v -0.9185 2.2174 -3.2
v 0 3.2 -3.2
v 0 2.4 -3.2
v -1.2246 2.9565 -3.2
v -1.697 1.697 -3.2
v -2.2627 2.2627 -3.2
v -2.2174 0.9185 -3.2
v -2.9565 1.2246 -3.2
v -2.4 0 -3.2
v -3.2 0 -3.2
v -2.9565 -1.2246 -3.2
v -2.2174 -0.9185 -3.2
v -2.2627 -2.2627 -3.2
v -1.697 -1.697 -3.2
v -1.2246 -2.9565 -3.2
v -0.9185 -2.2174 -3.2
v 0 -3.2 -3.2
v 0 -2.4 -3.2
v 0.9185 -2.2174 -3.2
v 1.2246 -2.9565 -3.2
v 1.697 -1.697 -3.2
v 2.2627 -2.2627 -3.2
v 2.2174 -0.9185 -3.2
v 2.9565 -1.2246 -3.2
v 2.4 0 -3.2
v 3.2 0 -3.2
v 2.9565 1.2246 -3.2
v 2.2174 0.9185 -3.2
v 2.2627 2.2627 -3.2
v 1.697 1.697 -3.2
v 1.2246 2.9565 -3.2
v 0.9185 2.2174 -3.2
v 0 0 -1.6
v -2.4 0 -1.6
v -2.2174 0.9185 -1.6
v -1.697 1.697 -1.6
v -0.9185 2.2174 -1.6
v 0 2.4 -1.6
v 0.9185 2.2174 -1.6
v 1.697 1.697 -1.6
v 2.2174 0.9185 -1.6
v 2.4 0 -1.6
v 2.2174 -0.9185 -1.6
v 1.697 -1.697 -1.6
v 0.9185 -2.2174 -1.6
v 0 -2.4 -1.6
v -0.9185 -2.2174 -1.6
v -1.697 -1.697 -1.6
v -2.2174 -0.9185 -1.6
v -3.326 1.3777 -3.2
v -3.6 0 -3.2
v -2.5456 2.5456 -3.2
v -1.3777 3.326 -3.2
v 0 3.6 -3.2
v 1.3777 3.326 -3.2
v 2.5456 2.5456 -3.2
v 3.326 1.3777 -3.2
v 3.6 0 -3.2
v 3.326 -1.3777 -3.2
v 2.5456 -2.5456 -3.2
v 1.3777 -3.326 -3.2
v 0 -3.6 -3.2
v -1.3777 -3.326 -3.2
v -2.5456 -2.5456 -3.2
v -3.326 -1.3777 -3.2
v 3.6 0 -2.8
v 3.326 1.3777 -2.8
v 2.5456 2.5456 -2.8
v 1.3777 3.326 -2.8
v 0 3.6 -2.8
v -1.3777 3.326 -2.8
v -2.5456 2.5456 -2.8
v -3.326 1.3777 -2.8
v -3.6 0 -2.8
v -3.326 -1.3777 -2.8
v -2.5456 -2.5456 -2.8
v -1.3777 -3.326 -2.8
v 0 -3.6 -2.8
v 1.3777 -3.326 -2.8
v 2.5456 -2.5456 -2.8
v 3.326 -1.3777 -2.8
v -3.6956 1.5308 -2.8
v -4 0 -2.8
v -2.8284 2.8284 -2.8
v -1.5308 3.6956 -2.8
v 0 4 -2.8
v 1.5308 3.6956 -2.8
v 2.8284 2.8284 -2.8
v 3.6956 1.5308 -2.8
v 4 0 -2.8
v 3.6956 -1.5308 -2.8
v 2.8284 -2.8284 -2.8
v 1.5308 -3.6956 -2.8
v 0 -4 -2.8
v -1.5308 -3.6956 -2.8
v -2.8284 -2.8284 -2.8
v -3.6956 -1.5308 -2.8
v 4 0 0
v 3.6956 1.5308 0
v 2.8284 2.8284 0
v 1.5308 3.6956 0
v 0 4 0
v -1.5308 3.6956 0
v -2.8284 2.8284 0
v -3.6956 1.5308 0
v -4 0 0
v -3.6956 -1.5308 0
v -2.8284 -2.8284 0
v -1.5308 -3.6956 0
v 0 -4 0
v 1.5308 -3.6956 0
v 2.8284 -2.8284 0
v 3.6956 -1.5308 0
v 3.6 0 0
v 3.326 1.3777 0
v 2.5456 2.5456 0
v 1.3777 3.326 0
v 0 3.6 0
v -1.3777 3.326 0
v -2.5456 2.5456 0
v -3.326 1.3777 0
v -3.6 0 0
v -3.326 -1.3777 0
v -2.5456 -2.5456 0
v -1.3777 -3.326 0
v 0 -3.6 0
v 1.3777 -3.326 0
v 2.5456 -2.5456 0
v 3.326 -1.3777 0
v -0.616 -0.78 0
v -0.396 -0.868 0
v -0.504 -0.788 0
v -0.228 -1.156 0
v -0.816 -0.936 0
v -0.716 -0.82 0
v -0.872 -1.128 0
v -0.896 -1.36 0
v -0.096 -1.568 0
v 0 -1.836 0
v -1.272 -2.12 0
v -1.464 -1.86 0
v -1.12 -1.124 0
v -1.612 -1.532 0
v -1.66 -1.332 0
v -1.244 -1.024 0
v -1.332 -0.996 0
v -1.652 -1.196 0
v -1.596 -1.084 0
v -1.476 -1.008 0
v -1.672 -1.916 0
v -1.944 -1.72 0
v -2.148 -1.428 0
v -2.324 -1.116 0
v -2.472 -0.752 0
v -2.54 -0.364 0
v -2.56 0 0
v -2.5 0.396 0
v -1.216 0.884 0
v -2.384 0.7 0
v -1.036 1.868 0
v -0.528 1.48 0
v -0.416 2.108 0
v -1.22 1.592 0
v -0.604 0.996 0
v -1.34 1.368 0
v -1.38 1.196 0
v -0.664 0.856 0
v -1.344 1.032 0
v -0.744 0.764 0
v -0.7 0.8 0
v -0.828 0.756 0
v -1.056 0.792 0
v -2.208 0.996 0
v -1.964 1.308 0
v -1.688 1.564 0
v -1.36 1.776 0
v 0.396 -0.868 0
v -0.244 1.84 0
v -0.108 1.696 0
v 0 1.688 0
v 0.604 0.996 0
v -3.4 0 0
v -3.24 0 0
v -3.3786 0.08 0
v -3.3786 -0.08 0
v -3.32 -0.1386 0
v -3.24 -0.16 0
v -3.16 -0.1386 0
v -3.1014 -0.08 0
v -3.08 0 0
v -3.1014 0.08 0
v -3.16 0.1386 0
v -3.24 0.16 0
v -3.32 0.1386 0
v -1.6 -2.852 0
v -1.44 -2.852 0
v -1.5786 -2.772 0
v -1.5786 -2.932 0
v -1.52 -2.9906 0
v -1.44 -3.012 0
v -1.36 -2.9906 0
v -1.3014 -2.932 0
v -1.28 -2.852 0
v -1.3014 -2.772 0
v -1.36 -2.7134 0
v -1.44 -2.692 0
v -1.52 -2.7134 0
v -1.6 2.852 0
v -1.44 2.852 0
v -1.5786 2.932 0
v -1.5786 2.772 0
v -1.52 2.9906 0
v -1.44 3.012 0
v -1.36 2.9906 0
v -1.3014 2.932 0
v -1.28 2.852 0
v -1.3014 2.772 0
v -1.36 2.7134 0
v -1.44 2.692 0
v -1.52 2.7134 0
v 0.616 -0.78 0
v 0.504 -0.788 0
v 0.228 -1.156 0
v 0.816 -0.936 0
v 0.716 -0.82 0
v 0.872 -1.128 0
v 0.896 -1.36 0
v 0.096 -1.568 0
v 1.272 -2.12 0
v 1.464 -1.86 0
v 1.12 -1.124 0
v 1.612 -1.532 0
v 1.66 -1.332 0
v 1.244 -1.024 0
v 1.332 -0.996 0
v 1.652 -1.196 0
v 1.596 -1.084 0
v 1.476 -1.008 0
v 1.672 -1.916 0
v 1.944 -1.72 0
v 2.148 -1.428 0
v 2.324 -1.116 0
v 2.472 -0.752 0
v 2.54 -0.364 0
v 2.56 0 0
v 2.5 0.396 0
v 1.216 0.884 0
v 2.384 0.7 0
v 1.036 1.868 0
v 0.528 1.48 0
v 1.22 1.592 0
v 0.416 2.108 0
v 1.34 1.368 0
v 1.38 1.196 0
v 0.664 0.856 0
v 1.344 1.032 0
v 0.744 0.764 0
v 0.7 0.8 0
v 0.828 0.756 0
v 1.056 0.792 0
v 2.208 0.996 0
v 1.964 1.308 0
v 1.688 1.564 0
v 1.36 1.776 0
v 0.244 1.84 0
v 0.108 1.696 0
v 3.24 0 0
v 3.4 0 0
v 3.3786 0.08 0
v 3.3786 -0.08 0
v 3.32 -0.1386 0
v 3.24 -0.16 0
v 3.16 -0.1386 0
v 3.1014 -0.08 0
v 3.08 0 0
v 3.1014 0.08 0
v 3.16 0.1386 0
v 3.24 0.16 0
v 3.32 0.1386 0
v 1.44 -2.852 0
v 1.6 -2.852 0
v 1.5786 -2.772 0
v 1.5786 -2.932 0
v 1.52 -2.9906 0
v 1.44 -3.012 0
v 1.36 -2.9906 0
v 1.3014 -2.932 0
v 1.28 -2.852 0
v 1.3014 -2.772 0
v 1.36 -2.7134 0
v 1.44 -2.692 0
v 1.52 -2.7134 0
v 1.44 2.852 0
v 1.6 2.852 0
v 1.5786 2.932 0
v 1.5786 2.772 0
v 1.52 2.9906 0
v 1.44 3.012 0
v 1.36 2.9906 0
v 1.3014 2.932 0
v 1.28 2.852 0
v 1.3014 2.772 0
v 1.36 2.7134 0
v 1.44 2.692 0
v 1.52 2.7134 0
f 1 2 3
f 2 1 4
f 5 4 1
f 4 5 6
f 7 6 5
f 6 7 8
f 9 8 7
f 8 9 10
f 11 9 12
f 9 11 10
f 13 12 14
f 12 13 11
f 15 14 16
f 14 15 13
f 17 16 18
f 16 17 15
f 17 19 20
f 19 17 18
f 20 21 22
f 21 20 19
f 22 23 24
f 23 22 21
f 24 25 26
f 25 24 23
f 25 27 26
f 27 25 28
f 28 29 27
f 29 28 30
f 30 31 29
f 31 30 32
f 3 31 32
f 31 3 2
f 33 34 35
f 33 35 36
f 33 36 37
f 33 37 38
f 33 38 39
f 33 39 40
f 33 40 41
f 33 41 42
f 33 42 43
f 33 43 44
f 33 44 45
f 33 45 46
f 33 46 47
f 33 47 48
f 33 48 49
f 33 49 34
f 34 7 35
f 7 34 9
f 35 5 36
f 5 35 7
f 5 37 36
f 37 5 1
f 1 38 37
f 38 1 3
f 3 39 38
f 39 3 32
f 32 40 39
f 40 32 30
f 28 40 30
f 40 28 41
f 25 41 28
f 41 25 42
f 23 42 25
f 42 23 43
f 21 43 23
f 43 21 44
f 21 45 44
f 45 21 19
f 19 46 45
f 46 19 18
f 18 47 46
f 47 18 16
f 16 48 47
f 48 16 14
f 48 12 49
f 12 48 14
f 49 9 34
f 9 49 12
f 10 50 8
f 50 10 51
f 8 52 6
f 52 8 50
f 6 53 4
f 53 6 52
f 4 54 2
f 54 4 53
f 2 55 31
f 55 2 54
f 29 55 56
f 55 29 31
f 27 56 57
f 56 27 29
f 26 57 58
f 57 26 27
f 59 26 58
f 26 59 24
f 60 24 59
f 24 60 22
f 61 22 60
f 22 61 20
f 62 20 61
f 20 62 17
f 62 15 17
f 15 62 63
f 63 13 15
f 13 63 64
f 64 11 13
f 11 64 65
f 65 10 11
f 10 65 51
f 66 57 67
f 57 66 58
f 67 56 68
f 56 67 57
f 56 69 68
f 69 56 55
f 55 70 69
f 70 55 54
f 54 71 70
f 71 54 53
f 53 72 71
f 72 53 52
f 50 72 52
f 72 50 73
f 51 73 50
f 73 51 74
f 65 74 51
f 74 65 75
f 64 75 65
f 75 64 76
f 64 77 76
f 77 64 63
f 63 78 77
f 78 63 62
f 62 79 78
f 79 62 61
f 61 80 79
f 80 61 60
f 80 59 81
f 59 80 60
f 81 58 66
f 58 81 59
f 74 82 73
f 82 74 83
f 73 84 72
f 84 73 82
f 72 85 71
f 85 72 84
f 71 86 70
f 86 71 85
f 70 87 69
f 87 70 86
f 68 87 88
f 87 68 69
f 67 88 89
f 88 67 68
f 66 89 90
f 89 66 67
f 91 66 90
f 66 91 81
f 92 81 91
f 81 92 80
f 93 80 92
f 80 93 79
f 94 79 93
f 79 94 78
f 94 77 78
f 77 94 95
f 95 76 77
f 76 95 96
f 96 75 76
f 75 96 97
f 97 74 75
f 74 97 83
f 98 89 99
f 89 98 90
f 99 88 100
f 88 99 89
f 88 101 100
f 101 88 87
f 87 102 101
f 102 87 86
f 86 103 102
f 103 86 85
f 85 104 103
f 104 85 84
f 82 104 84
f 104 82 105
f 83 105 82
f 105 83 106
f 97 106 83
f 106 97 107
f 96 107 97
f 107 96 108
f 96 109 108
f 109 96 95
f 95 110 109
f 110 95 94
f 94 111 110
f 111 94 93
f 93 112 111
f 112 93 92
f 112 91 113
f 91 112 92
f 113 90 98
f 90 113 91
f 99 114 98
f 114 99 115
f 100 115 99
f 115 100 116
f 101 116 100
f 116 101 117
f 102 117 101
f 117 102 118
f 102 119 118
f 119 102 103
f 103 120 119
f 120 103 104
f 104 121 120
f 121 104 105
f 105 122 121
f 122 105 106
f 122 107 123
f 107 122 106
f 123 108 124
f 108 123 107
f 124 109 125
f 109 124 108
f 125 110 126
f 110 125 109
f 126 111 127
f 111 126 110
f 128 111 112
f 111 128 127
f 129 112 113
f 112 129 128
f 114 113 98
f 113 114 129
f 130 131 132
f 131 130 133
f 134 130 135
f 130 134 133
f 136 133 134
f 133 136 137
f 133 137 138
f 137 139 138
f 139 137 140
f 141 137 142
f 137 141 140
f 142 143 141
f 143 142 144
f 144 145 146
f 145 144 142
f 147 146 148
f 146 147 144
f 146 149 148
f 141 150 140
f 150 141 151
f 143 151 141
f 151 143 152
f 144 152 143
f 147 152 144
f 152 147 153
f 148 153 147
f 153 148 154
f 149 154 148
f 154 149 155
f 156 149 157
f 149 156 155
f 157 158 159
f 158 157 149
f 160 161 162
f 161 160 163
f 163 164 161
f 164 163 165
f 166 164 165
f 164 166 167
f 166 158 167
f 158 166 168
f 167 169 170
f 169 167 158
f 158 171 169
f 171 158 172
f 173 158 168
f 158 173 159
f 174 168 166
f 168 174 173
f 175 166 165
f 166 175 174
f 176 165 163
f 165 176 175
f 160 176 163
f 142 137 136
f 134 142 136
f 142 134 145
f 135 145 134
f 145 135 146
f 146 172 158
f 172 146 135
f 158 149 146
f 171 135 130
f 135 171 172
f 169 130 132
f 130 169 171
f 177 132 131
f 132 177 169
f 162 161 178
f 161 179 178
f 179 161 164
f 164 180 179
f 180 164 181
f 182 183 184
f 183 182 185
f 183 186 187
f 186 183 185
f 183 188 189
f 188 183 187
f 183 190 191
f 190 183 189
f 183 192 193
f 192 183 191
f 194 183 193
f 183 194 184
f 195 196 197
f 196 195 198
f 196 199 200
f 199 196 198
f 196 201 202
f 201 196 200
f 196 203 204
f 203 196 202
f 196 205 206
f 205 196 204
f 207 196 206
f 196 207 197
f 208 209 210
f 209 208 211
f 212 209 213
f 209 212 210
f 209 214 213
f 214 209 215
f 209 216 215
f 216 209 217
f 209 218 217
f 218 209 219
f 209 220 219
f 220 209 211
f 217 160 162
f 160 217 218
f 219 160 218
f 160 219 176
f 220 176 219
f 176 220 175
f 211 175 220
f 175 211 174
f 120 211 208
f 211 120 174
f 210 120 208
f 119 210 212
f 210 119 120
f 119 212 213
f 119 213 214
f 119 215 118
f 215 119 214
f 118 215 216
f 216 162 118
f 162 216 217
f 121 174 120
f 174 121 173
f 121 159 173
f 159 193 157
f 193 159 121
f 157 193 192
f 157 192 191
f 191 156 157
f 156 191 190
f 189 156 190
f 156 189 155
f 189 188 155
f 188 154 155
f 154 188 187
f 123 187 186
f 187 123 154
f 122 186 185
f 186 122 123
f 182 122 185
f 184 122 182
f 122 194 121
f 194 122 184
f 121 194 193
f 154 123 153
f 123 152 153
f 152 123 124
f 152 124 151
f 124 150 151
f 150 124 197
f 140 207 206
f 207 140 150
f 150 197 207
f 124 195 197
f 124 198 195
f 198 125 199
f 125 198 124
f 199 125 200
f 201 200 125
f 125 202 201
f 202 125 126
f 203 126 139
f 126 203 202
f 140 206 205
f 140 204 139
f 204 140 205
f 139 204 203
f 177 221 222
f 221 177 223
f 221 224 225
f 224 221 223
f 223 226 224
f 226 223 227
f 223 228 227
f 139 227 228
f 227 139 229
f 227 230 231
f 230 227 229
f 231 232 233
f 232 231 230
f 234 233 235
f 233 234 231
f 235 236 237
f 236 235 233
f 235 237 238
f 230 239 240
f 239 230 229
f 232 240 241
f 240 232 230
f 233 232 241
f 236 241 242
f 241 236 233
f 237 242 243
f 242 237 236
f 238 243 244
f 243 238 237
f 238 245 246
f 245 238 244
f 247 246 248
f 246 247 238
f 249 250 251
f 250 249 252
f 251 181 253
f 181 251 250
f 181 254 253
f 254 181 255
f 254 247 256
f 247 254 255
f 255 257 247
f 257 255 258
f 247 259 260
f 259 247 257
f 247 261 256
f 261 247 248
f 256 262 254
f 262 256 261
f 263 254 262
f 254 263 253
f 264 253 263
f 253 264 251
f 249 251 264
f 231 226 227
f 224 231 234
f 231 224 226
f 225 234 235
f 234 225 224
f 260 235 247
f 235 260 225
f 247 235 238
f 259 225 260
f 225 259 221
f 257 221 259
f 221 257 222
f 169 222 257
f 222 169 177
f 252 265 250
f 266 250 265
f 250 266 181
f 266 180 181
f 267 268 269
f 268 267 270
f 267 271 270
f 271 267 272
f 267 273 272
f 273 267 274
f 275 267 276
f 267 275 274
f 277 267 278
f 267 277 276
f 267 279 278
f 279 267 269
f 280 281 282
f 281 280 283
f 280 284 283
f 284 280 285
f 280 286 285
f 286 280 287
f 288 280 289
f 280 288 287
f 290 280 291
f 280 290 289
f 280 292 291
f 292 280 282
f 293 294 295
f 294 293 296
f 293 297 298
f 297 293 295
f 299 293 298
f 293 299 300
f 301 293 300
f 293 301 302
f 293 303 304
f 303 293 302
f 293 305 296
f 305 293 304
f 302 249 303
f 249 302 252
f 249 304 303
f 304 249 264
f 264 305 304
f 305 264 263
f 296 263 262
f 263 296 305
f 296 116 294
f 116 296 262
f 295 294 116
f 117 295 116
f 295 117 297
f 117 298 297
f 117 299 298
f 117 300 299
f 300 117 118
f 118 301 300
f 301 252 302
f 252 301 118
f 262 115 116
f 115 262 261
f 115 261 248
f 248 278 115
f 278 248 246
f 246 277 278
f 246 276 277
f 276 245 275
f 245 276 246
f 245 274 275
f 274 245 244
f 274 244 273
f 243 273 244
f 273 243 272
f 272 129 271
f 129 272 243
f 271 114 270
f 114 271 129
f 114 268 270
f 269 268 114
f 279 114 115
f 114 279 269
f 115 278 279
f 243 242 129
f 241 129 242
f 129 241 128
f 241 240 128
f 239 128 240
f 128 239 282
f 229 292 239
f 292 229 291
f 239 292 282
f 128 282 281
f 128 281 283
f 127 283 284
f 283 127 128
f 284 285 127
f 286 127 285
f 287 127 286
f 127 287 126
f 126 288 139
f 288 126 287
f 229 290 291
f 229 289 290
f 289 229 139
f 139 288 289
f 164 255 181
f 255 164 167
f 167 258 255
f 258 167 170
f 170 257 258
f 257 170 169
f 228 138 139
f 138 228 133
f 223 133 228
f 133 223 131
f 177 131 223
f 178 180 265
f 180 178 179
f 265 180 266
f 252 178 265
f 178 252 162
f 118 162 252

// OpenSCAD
use <../lib.scad>
use <../p/4-4ering.scad>
use <s/98138s01.scad>
$fa=1; $fs=0.2;
function ldraw_lib__98138pb9(realsolid=false) = [
// 0 Tile  1 x  1 Round with Metallic Silver Batman Logo and Six Reddish Brown Rivets Pattern
// 0 Name: 98138pb9.dat
// 0 Author: Gerald Lasser [GeraldLasser]
// 0 !LDRAW_ORG Part UPDATE 2022-01
// 0 !LICENSE Licensed under CC BY 2.0 and CC BY 4.0 : see CAreadme.txt
// 
// 0 BFC CERTIFY CCW
  [0,"BFC","CERTIFY"],
  [0,"BFC","CCW"],
// 
// 0 !KEYWORDS 1989, Batmobile, Bricklink 98138pb111, Set 76139
// 
// 0 !HISTORY 2022-01-14 [PTadmin] Official Update 2022-01
// 
// 
// 1 16 0 0 0 1 0 0 0 1 0 0 0 1 s\98138s01.dat
  [1,16,0,0,0,1,0,0,0,1,0,0,0,1, ldraw_lib__s__98138s01(realsolid)],
// 1 16 0 0 0 9 0 0 0 1 0 0 0 9 4-4ering.dat
  [1,16,0,0,0,9,0,0,0,1,0,0,0,9, ldraw_lib__4_4ering(realsolid)],
// 4 16 -0.57 0 -2.89 -0.99 0 -2.17 -1.26 0 -1.97 -1.54 0 -1.95
  [4,16,-0.57,0,-2.89,-0.99,0,-2.17,-1.26,0,-1.97,-1.54,0,-1.95],
// 4 16 -0.57 0 -2.89 -1.54 0 -1.95 -1.79 0 -2.05 -2.04 0 -2.34
  [4,16,-0.57,0,-2.89,-1.54,0,-1.95,-1.79,0,-2.05,-2.04,0,-2.34],
// 4 16 -0.57 0 -2.89 -2.04 0 -2.34 -2.18 0 -2.82 -2.24 0 -3.4
  [4,16,-0.57,0,-2.89,-2.04,0,-2.34,-2.18,0,-2.82,-2.24,0,-3.4],
// 3 16 -0.57 0 -2.89 -2.24 0 -3.4 -0.24 0 -3.92
  [3,16,-0.57,0,-2.89,-2.24,0,-3.4,-0.24,0,-3.92],
// 4 16 0 0 -4.59 -0.24 0 -3.92 -2.24 0 -3.4 -3.18 0 -5.3
  [4,16,0,0,-4.59,-0.24,0,-3.92,-2.24,0,-3.4,-3.18,0,-5.3],
// 4 16 -3.66 0 -4.65 -3.18 0 -5.3 -2.24 0 -3.4 -2.8 0 -2.81
  [4,16,-3.66,0,-4.65,-3.18,0,-5.3,-2.24,0,-3.4,-2.8,0,-2.81],
// 4 16 -4.03 0 -3.83 -3.66 0 -4.65 -2.8 0 -2.81 -4.15 0 -3.33
  [4,16,-4.03,0,-3.83,-3.66,0,-4.65,-2.8,0,-2.81,-4.15,0,-3.33],
// 4 16 -4.15 0 -3.33 -2.8 0 -2.81 -3.11 0 -2.56 -3.33 0 -2.49
  [4,16,-4.15,0,-3.33,-2.8,0,-2.81,-3.11,0,-2.56,-3.33,0,-2.49],
// 4 16 -4.13 0 -2.99 -4.15 0 -3.33 -3.33 0 -2.49 -3.99 0 -2.71
  [4,16,-4.13,0,-2.99,-4.15,0,-3.33,-3.33,0,-2.49,-3.99,0,-2.71],
// 3 16 -3.33 0 -2.49 -3.69 0 -2.52 -3.99 0 -2.71
  [3,16,-3.33,0,-2.49,-3.69,0,-2.52,-3.99,0,-2.71],
// 4 80 -4.18 0 -4.79 -3.18 0 -5.3 -3.66 0 -4.65 -4.86 0 -4.3
  [4,80,-4.18,0,-4.79,-3.18,0,-5.3,-3.66,0,-4.65,-4.86,0,-4.3],
// 4 80 -4.86 0 -4.3 -3.66 0 -4.65 -4.03 0 -3.83 -5.37 0 -3.57
  [4,80,-4.86,0,-4.3,-3.66,0,-4.65,-4.03,0,-3.83,-5.37,0,-3.57],
// 3 80 -4.15 0 -3.33 -5.37 0 -3.57 -4.03 0 -3.83
  [3,80,-4.15,0,-3.33,-5.37,0,-3.57,-4.03,0,-3.83],
// 4 80 -5.37 0 -3.57 -4.15 0 -3.33 -4.13 0 -2.99 -5.81 0 -2.79
  [4,80,-5.37,0,-3.57,-4.15,0,-3.33,-4.13,0,-2.99,-5.81,0,-2.79],
// 4 80 -5.81 0 -2.79 -4.13 0 -2.99 -3.99 0 -2.71 -6.18 0 -1.88
  [4,80,-5.81,0,-2.79,-4.13,0,-2.99,-3.99,0,-2.71,-6.18,0,-1.88],
// 4 80 -6.35 0 -.91 -6.18 0 -1.88 -3.99 0 -2.71 -3.69 0 -2.52
  [4,80,-6.35,0,-.91,-6.18,0,-1.88,-3.99,0,-2.71,-3.69,0,-2.52],
// 4 80 -6.4 0 0 -6.35 0 -.91 -3.69 0 -2.52 -6.25 0 .99
  [4,80,-6.4,0,0,-6.35,0,-.91,-3.69,0,-2.52,-6.25,0,.99],
// 4 80 -6.25 0 .99 -3.69 0 -2.52 -3.04 0 2.21 -5.96 0 1.75
  [4,80,-6.25,0,.99,-3.69,0,-2.52,-3.04,0,2.21,-5.96,0,1.75],
// 4 16 -1.04 0 5.27 -2.59 0 4.67 -3.05 0 3.98 -1.32 0 3.7
  [4,16,-1.04,0,5.27,-2.59,0,4.67,-3.05,0,3.98,-1.32,0,3.7],
// 4 16 -1.32 0 3.7 -3.05 0 3.98 -3.35 0 3.42 -1.51 0 2.49
  [4,16,-1.32,0,3.7,-3.05,0,3.98,-3.35,0,3.42,-1.51,0,2.49],
// 4 16 -1.66 0 2.14 -1.51 0 2.49 -3.35 0 3.42 -3.45 0 2.99
  [4,16,-1.66,0,2.14,-1.51,0,2.49,-3.35,0,3.42,-3.45,0,2.99],
// 4 16 -1.66 0 2.14 -3.45 0 2.99 -3.36 0 2.58 -3.04 0 2.21
  [4,16,-1.66,0,2.14,-3.45,0,2.99,-3.36,0,2.58,-3.04,0,2.21],
// 4 16 -1.75 0 2 -1.66 0 2.14 -3.04 0 2.21 -1.86 0 1.91
  [4,16,-1.75,0,2,-1.66,0,2.14,-3.04,0,2.21,-1.86,0,1.91],
// 4 16 -2.07 0 1.89 -1.86 0 1.91 -3.04 0 2.21 -2.64 0 1.98
  [4,16,-2.07,0,1.89,-1.86,0,1.91,-3.04,0,2.21,-2.64,0,1.98],
// 4 80 -5.96 0 1.75 -3.04 0 2.21 -3.36 0 2.58 -5.52 0 2.49
  [4,80,-5.96,0,1.75,-3.04,0,2.21,-3.36,0,2.58,-5.52,0,2.49],
// 4 80 -5.52 0 2.49 -3.36 0 2.58 -3.45 0 2.99 -4.91 0 3.27
  [4,80,-5.52,0,2.49,-3.36,0,2.58,-3.45,0,2.99,-4.91,0,3.27],
// 4 80 -4.91 0 3.27 -3.45 0 2.99 -3.35 0 3.42 -4.22 0 3.91
  [4,80,-4.91,0,3.27,-3.45,0,2.99,-3.35,0,3.42,-4.22,0,3.91],
// 4 80 -4.22 0 3.91 -3.35 0 3.42 -3.05 0 3.98 -3.4 0 4.44
  [4,80,-4.22,0,3.91,-3.35,0,3.42,-3.05,0,3.98,-3.4,0,4.44],
// 3 80 -2.59 0 4.67 -3.4 0 4.44 -3.05 0 3.98
  [3,80,-2.59,0,4.67,-3.4,0,4.44,-3.05,0,3.98],
// 3 80 -2.8 0 -2.81 -2.24 0 -3.4 -2.18 0 -2.82
  [3,80,-2.8,0,-2.81,-2.24,0,-3.4,-2.18,0,-2.82],
// 4 80 -3.11 0 -2.56 -2.8 0 -2.81 -2.18 0 -2.82 -2.04 0 -2.34
  [4,80,-3.11,0,-2.56,-2.8,0,-2.81,-2.18,0,-2.82,-2.04,0,-2.34],
// 4 80 -3.33 0 -2.49 -3.11 0 -2.56 -2.04 0 -2.34 -1.79 0 -2.05
  [4,80,-3.33,0,-2.49,-3.11,0,-2.56,-2.04,0,-2.34,-1.79,0,-2.05],
// 4 80 -3.33 0 -2.49 -1.79 0 -2.05 -2.64 0 1.98 -3.04 0 2.21
  [4,80,-3.33,0,-2.49,-1.79,0,-2.05,-2.64,0,1.98,-3.04,0,2.21],
// 3 80 -3.04 0 2.21 -3.69 0 -2.52 -3.33 0 -2.49
  [3,80,-3.04,0,2.21,-3.69,0,-2.52,-3.33,0,-2.49],
// 4 80 -2.07 0 1.89 -2.64 0 1.98 -1.79 0 -2.05 -1.54 0 -1.95
  [4,80,-2.07,0,1.89,-2.64,0,1.98,-1.79,0,-2.05,-1.54,0,-1.95],
// 4 80 -2.07 0 1.89 -1.54 0 -1.95 -1.26 0 -1.97 -1.86 0 1.91
  [4,80,-2.07,0,1.89,-1.54,0,-1.95,-1.26,0,-1.97,-1.86,0,1.91],
// 4 80 -1.86 0 1.91 -1.26 0 -1.97 -.99 0 -2.17 .99 0 -2.17
  [4,80,-1.86,0,1.91,-1.26,0,-1.97,-.99,0,-2.17,.99,0,-2.17],
// 3 80 -1.04 0 5.27 -1.32 0 3.7 -.61 0 4.6
  [3,80,-1.04,0,5.27,-1.32,0,3.7,-.61,0,4.6],
// 4 80 -.27 0 4.24 -.61 0 4.6 -1.32 0 3.7 -1.51 0 2.49
  [4,80,-.27,0,4.24,-.61,0,4.6,-1.32,0,3.7,-1.51,0,2.49],
// 4 80 0 0 4.22 -.27 0 4.24 -1.51 0 2.49 1.51 0 2.49
  [4,80,0,0,4.22,-.27,0,4.24,-1.51,0,2.49,1.51,0,2.49],
// 4 70 -8.1 0 0 -8.44641 0 0.2 -8.5 0 0 -8.44641 0 -0.2
  [4,70,-8.1,0,0,-8.44641,0,0.2,-8.5,0,0,-8.44641,0,-0.2],
// 4 70 -8.1 0 0 -8.44641 0 -0.2 -8.3 0 -0.34641 -8.1 0 -0.4
  [4,70,-8.1,0,0,-8.44641,0,-0.2,-8.3,0,-0.34641,-8.1,0,-0.4],
// 4 70 -8.1 0 0 -8.1 0 -0.4 -7.9 0 -0.34641 -7.75359 0 -0.2
  [4,70,-8.1,0,0,-8.1,0,-0.4,-7.9,0,-0.34641,-7.75359,0,-0.2],
// 4 70 -8.1 0 0 -7.75359 0 -0.2 -7.7 0 0 -7.75359 0 0.2
  [4,70,-8.1,0,0,-7.75359,0,-0.2,-7.7,0,0,-7.75359,0,0.2],
// 4 70 -8.1 0 0 -7.75359 0 0.2 -7.9 0 0.34641 -8.1 0 0.4
  [4,70,-8.1,0,0,-7.75359,0,0.2,-7.9,0,0.34641,-8.1,0,0.4],
// 4 70 -8.1 0 0 -8.1 0 0.4 -8.3 0 0.34641 -8.44641 0 0.2
  [4,70,-8.1,0,0,-8.1,0,0.4,-8.3,0,0.34641,-8.44641,0,0.2],
// 4 70 -3.6 0 -7.13 -3.94641 0 -6.93 -4 0 -7.13 -3.94641 0 -7.33
  [4,70,-3.6,0,-7.13,-3.94641,0,-6.93,-4,0,-7.13,-3.94641,0,-7.33],
// 4 70 -3.6 0 -7.13 -3.94641 0 -7.33 -3.8 0 -7.47641 -3.6 0 -7.53
  [4,70,-3.6,0,-7.13,-3.94641,0,-7.33,-3.8,0,-7.47641,-3.6,0,-7.53],
// 4 70 -3.6 0 -7.13 -3.6 0 -7.53 -3.4 0 -7.47641 -3.25359 0 -7.33
  [4,70,-3.6,0,-7.13,-3.6,0,-7.53,-3.4,0,-7.47641,-3.25359,0,-7.33],
// 4 70 -3.6 0 -7.13 -3.25359 0 -7.33 -3.2 0 -7.13 -3.25359 0 -6.93
  [4,70,-3.6,0,-7.13,-3.25359,0,-7.33,-3.2,0,-7.13,-3.25359,0,-6.93],
// 4 70 -3.6 0 -7.13 -3.25359 0 -6.93 -3.4 0 -6.78359 -3.6 0 -6.73
  [4,70,-3.6,0,-7.13,-3.25359,0,-6.93,-3.4,0,-6.78359,-3.6,0,-6.73],
// 4 70 -3.6 0 -7.13 -3.6 0 -6.73 -3.8 0 -6.78359 -3.94641 0 -6.93
  [4,70,-3.6,0,-7.13,-3.6,0,-6.73,-3.8,0,-6.78359,-3.94641,0,-6.93],
// 4 70 -4 0 7.13 -3.94641 0 6.93 -3.6 0 7.13 -3.94641 0 7.33
  [4,70,-4,0,7.13,-3.94641,0,6.93,-3.6,0,7.13,-3.94641,0,7.33],
// 4 70 -3.8 0 7.47641 -3.94641 0 7.33 -3.6 0 7.13 -3.6 0 7.53
  [4,70,-3.8,0,7.47641,-3.94641,0,7.33,-3.6,0,7.13,-3.6,0,7.53],
// 4 70 -3.4 0 7.47641 -3.6 0 7.53 -3.6 0 7.13 -3.25359 0 7.33
  [4,70,-3.4,0,7.47641,-3.6,0,7.53,-3.6,0,7.13,-3.25359,0,7.33],
// 4 70 -3.2 0 7.13 -3.25359 0 7.33 -3.6 0 7.13 -3.25359 0 6.93
  [4,70,-3.2,0,7.13,-3.25359,0,7.33,-3.6,0,7.13,-3.25359,0,6.93],
// 4 70 -3.4 0 6.78359 -3.25359 0 6.93 -3.6 0 7.13 -3.6 0 6.73
  [4,70,-3.4,0,6.78359,-3.25359,0,6.93,-3.6,0,7.13,-3.6,0,6.73],
// 4 70 -3.8 0 6.78359 -3.6 0 6.73 -3.6 0 7.13 -3.94641 0 6.93
  [4,70,-3.8,0,6.78359,-3.6,0,6.73,-3.6,0,7.13,-3.94641,0,6.93],
// 4 16 -1.04 0 5.27 -3.25359 0 6.93 -3.4 0 6.78359 -2.59 0 4.67
  [4,16,-1.04,0,5.27,-3.25359,0,6.93,-3.4,0,6.78359,-2.59,0,4.67],
// 4 16 -3.4 0 4.44 -2.59 0 4.67 -3.4 0 6.78359 -3.6 0 6.73
  [4,16,-3.4,0,4.44,-2.59,0,4.67,-3.4,0,6.78359,-3.6,0,6.73],
// 4 16 -3.4 0 4.44 -3.6 0 6.73 -3.8 0 6.78359 -4.22 0 3.91
  [4,16,-3.4,0,4.44,-3.6,0,6.73,-3.8,0,6.78359,-4.22,0,3.91],
// 4 16 -4.22 0 3.91 -3.8 0 6.78359 -3.94641 0 6.93 -4.91 0 3.27
  [4,16,-4.22,0,3.91,-3.8,0,6.78359,-3.94641,0,6.93,-4.91,0,3.27],
// 4 16 -6.3639 0 6.3639 -4.91 0 3.27 -3.94641 0 6.93 -4 0 7.13
  [4,16,-6.3639,0,6.3639,-4.91,0,3.27,-3.94641,0,6.93,-4,0,7.13],
// 3 16 -3.94641 0 7.33 -6.3639 0 6.3639 -4 0 7.13
  [3,16,-3.94641,0,7.33,-6.3639,0,6.3639,-4,0,7.13],
// 4 16 -6.3639 0 6.3639 -3.94641 0 7.33 -3.8 0 7.47641 -3.4443 0 8.3151
  [4,16,-6.3639,0,6.3639,-3.94641,0,7.33,-3.8,0,7.47641,-3.4443,0,8.3151],
// 3 16 -3.4443 0 8.3151 -3.8 0 7.47641 -3.6 0 7.53
  [3,16,-3.4443,0,8.3151,-3.8,0,7.47641,-3.6,0,7.53],
// 3 16 -3.4443 0 8.3151 -3.6 0 7.53 -3.4 0 7.47641
  [3,16,-3.4443,0,8.3151,-3.6,0,7.53,-3.4,0,7.47641],
// 4 16 -3.4443 0 8.3151 -3.4 0 7.47641 -3.25359 0 7.33 0 0 9
  [4,16,-3.4443,0,8.3151,-3.4,0,7.47641,-3.25359,0,7.33,0,0,9],
// 3 16 0 0 9 -3.25359 0 7.33 -3.2 0 7.13
  [3,16,0,0,9,-3.25359,0,7.33,-3.2,0,7.13],
// 4 16 0 0 9 -3.2 0 7.13 -3.25359 0 6.93 -1.04 0 5.27
  [4,16,0,0,9,-3.2,0,7.13,-3.25359,0,6.93,-1.04,0,5.27],
// 4 16 -8.3151 0 3.4443 -5.52 0 2.49 -4.91 0 3.27 -6.3639 0 6.3639
  [4,16,-8.3151,0,3.4443,-5.52,0,2.49,-4.91,0,3.27,-6.3639,0,6.3639],
// 3 16 -8.3151 0 3.4443 -5.96 0 1.75 -5.52 0 2.49
  [3,16,-8.3151,0,3.4443,-5.96,0,1.75,-5.52,0,2.49],
// 4 16 -6.25 0 0.99 -5.96 0 1.75 -8.3151 0 3.4443 -8.1 0 0.4
  [4,16,-6.25,0,0.99,-5.96,0,1.75,-8.3151,0,3.4443,-8.1,0,0.4],
// 3 16 -6.25 0 0.99 -8.1 0 0.4 -7.9 0 0.34641
  [3,16,-6.25,0,0.99,-8.1,0,0.4,-7.9,0,0.34641],
// 3 16 -6.25 0 0.99 -7.9 0 0.34641 -7.75359 0 0.2
  [3,16,-6.25,0,0.99,-7.9,0,0.34641,-7.75359,0,0.2],
// 4 16 -6.25 0 0.99 -7.75359 0 0.2 -7.7 0 0 -6.4 0 0
  [4,16,-6.25,0,0.99,-7.75359,0,0.2,-7.7,0,0,-6.4,0,0],
// 4 16 -6.4 0 0 -7.7 0 0 -7.75359 0 -0.2 -6.35 0 -0.91
  [4,16,-6.4,0,0,-7.7,0,0,-7.75359,0,-0.2,-6.35,0,-0.91],
// 3 16 -7.75359 0 -0.2 -7.9 0 -0.34641 -6.35 0 -0.91
  [3,16,-7.75359,0,-0.2,-7.9,0,-0.34641,-6.35,0,-0.91],
// 4 16 -6.35 0 -0.91 -7.9 0 -0.34641 -8.1 0 -0.4 -6.18 0 -1.88
  [4,16,-6.35,0,-0.91,-7.9,0,-0.34641,-8.1,0,-0.4,-6.18,0,-1.88],
// 4 16 -8.3151 0 -3.4443 -6.18 0 -1.88 -8.1 0 -0.4 -8.3 0 -0.34641
  [4,16,-8.3151,0,-3.4443,-6.18,0,-1.88,-8.1,0,-0.4,-8.3,0,-0.34641],
// 4 16 -8.3151 0 -3.4443 -8.3 0 -0.34641 -8.44641 0 -0.2 -9 0 0
  [4,16,-8.3151,0,-3.4443,-8.3,0,-0.34641,-8.44641,0,-0.2,-9,0,0],
// 3 16 -8.5 0 0 -9 0 0 -8.44641 0 -0.2
  [3,16,-8.5,0,0,-9,0,0,-8.44641,0,-0.2],
// 3 16 -8.44641 0 0.2 -9 0 0 -8.5 0 0
  [3,16,-8.44641,0,0.2,-9,0,0,-8.5,0,0],
// 4 16 -9 0 0 -8.44641 0 0.2 -8.3 0 0.34641 -8.3151 0 3.4443
  [4,16,-9,0,0,-8.44641,0,0.2,-8.3,0,0.34641,-8.3151,0,3.4443],
// 3 16 -8.3151 0 3.4443 -8.3 0 0.34641 -8.1 0 0.4
  [3,16,-8.3151,0,3.4443,-8.3,0,0.34641,-8.1,0,0.4],
// 3 16 -6.18 0 -1.88 -8.3151 0 -3.4443 -5.81 0 -2.79
  [3,16,-6.18,0,-1.88,-8.3151,0,-3.4443,-5.81,0,-2.79],
// 4 16 -5.37 0 -3.57 -5.81 0 -2.79 -8.3151 0 -3.4443 -6.3639 0 -6.3639
  [4,16,-5.37,0,-3.57,-5.81,0,-2.79,-8.3151,0,-3.4443,-6.3639,0,-6.3639],
// 3 16 -5.37 0 -3.57 -6.3639 0 -6.3639 -4.86 0 -4.3
  [3,16,-5.37,0,-3.57,-6.3639,0,-6.3639,-4.86,0,-4.3],
// 4 16 -4.18 0 -4.79 -4.86 0 -4.3 -6.3639 0 -6.3639 -3.94641 0 -6.93
  [4,16,-4.18,0,-4.79,-4.86,0,-4.3,-6.3639,0,-6.3639,-3.94641,0,-6.93],
// 4 16 -3.6 0 -6.73 -3.18 0 -5.3 -4.18 0 -4.79 -3.8 0 -6.78359
  [4,16,-3.6,0,-6.73,-3.18,0,-5.3,-4.18,0,-4.79,-3.8,0,-6.78359],
// 3 16 -4.18 0 -4.79 -3.94641 0 -6.93 -3.8 0 -6.78359
  [3,16,-4.18,0,-4.79,-3.94641,0,-6.93,-3.8,0,-6.78359],
// 3 16 -6.3639 0 -6.3639 -4 0 -7.13 -3.94641 0 -6.93
  [3,16,-6.3639,0,-6.3639,-4,0,-7.13,-3.94641,0,-6.93],
// 3 16 -6.3639 0 -6.3639 -3.94641 0 -7.33 -4 0 -7.13
  [3,16,-6.3639,0,-6.3639,-3.94641,0,-7.33,-4,0,-7.13],
// 4 16 -3.8 0 -7.47641 -3.94641 0 -7.33 -6.3639 0 -6.3639 -3.4443 0 -8.3151
  [4,16,-3.8,0,-7.47641,-3.94641,0,-7.33,-6.3639,0,-6.3639,-3.4443,0,-8.3151],
// 3 16 -3.8 0 -7.47641 -3.4443 0 -8.3151 -3.6 0 -7.53
  [3,16,-3.8,0,-7.47641,-3.4443,0,-8.3151,-3.6,0,-7.53],
// 3 16 -3.4 0 -7.47641 -3.6 0 -7.53 -3.4443 0 -8.3151
  [3,16,-3.4,0,-7.47641,-3.6,0,-7.53,-3.4443,0,-8.3151],
// 4 16 -3.25359 0 -7.33 -3.4 0 -7.47641 -3.4443 0 -8.3151 0 0 -9
  [4,16,-3.25359,0,-7.33,-3.4,0,-7.47641,-3.4443,0,-8.3151,0,0,-9],
// 4 16 -3.2 0 -7.13 -3.25359 0 -7.33 0 0 -9 0 0 -4.59
  [4,16,-3.2,0,-7.13,-3.25359,0,-7.33,0,0,-9,0,0,-4.59],
// 3 16 -3.18 0 -5.3 -3.6 0 -6.73 -3.4 0 -6.78359
  [3,16,-3.18,0,-5.3,-3.6,0,-6.73,-3.4,0,-6.78359],
// 4 16 -3.18 0 -5.3 -3.4 0 -6.78359 -3.25359 0 -6.93 0 0 -4.59
  [4,16,-3.18,0,-5.3,-3.4,0,-6.78359,-3.25359,0,-6.93,0,0,-4.59],
// 3 16 0 0 -4.59 -3.25359 0 -6.93 -3.2 0 -7.13
  [3,16,0,0,-4.59,-3.25359,0,-6.93,-3.2,0,-7.13],
// 4 16 1.26 0 -1.97 0.99 0 -2.17 0.57 0 -2.89 1.54 0 -1.95
  [4,16,1.26,0,-1.97,0.99,0,-2.17,0.57,0,-2.89,1.54,0,-1.95],
// 4 16 1.79 0 -2.05 1.54 0 -1.95 0.57 0 -2.89 2.04 0 -2.34
  [4,16,1.79,0,-2.05,1.54,0,-1.95,0.57,0,-2.89,2.04,0,-2.34],
// 4 16 2.18 0 -2.82 2.04 0 -2.34 0.57 0 -2.89 2.24 0 -3.4
  [4,16,2.18,0,-2.82,2.04,0,-2.34,0.57,0,-2.89,2.24,0,-3.4],
// 3 16 0.57 0 -2.89 0.24 0 -3.92 2.24 0 -3.4
  [3,16,0.57,0,-2.89,0.24,0,-3.92,2.24,0,-3.4],
// 4 16 2.24 0 -3.4 0.24 0 -3.92 0 0 -4.59 3.18 0 -5.3
  [4,16,2.24,0,-3.4,0.24,0,-3.92,0,0,-4.59,3.18,0,-5.3],
// 4 16 2.24 0 -3.4 3.18 0 -5.3 3.66 0 -4.65 2.8 0 -2.81
  [4,16,2.24,0,-3.4,3.18,0,-5.3,3.66,0,-4.65,2.8,0,-2.81],
// 4 16 2.8 0 -2.81 3.66 0 -4.65 4.03 0 -3.83 4.15 0 -3.33
  [4,16,2.8,0,-2.81,3.66,0,-4.65,4.03,0,-3.83,4.15,0,-3.33],
// 4 16 3.11 0 -2.56 2.8 0 -2.81 4.15 0 -3.33 3.33 0 -2.49
  [4,16,3.11,0,-2.56,2.8,0,-2.81,4.15,0,-3.33,3.33,0,-2.49],
// 4 16 3.33 0 -2.49 4.15 0 -3.33 4.13 0 -2.99 3.99 0 -2.71
  [4,16,3.33,0,-2.49,4.15,0,-3.33,4.13,0,-2.99,3.99,0,-2.71],
// 3 16 3.33 0 -2.49 3.99 0 -2.71 3.69 0 -2.52
  [3,16,3.33,0,-2.49,3.99,0,-2.71,3.69,0,-2.52],
// 4 80 3.66 0 -4.65 3.18 0 -5.3 4.18 0 -4.79 4.86 0 -4.3
  [4,80,3.66,0,-4.65,3.18,0,-5.3,4.18,0,-4.79,4.86,0,-4.3],
// 4 80 4.03 0 -3.83 3.66 0 -4.65 4.86 0 -4.3 5.37 0 -3.57
  [4,80,4.03,0,-3.83,3.66,0,-4.65,4.86,0,-4.3,5.37,0,-3.57],
// 3 80 4.15 0 -3.33 4.03 0 -3.83 5.37 0 -3.57
  [3,80,4.15,0,-3.33,4.03,0,-3.83,5.37,0,-3.57],
// 4 80 4.13 0 -2.99 4.15 0 -3.33 5.37 0 -3.57 5.81 0 -2.79
  [4,80,4.13,0,-2.99,4.15,0,-3.33,5.37,0,-3.57,5.81,0,-2.79],
// 4 80 3.99 0 -2.71 4.13 0 -2.99 5.81 0 -2.79 6.18 0 -1.88
  [4,80,3.99,0,-2.71,4.13,0,-2.99,5.81,0,-2.79,6.18,0,-1.88],
// 4 80 3.99 0 -2.71 6.18 0 -1.88 6.35 0 -.91 3.69 0 -2.52
  [4,80,3.99,0,-2.71,6.18,0,-1.88,6.35,0,-.91,3.69,0,-2.52],
// 4 80 3.69 0 -2.52 6.35 0 -.91 6.4 0 0 6.25 0 .99
  [4,80,3.69,0,-2.52,6.35,0,-.91,6.4,0,0,6.25,0,.99],
// 4 80 3.04 0 2.21 3.69 0 -2.52 6.25 0 .99 5.96 0 1.75
  [4,80,3.04,0,2.21,3.69,0,-2.52,6.25,0,.99,5.96,0,1.75],
// 4 16 3.05 0 3.98 2.59 0 4.67 1.04 0 5.27 1.32 0 3.7
  [4,16,3.05,0,3.98,2.59,0,4.67,1.04,0,5.27,1.32,0,3.7],
// 4 16 3.35 0 3.42 3.05 0 3.98 1.32 0 3.7 1.51 0 2.49
  [4,16,3.35,0,3.42,3.05,0,3.98,1.32,0,3.7,1.51,0,2.49],
// 4 16 3.35 0 3.42 1.51 0 2.49 1.66 0 2.14 3.45 0 2.99
  [4,16,3.35,0,3.42,1.51,0,2.49,1.66,0,2.14,3.45,0,2.99],
// 4 16 3.36 0 2.58 3.45 0 2.99 1.66 0 2.14 3.04 0 2.21
  [4,16,3.36,0,2.58,3.45,0,2.99,1.66,0,2.14,3.04,0,2.21],
// 4 16 3.04 0 2.21 1.66 0 2.14 1.75 0 2 1.86 0 1.91
  [4,16,3.04,0,2.21,1.66,0,2.14,1.75,0,2,1.86,0,1.91],
// 4 16 3.04 0 2.21 1.86 0 1.91 2.07 0 1.89 2.64 0 1.98
  [4,16,3.04,0,2.21,1.86,0,1.91,2.07,0,1.89,2.64,0,1.98],
// 4 80 3.36 0 2.58 3.04 0 2.21 5.96 0 1.75 5.52 0 2.49
  [4,80,3.36,0,2.58,3.04,0,2.21,5.96,0,1.75,5.52,0,2.49],
// 4 80 3.45 0 2.99 3.36 0 2.58 5.52 0 2.49 4.91 0 3.27
  [4,80,3.45,0,2.99,3.36,0,2.58,5.52,0,2.49,4.91,0,3.27],
// 4 80 3.35 0 3.42 3.45 0 2.99 4.91 0 3.27 4.22 0 3.91
  [4,80,3.35,0,3.42,3.45,0,2.99,4.91,0,3.27,4.22,0,3.91],
// 4 80 3.05 0 3.98 3.35 0 3.42 4.22 0 3.91 3.4 0 4.44
  [4,80,3.05,0,3.98,3.35,0,3.42,4.22,0,3.91,3.4,0,4.44],
// 3 80 2.59 0 4.67 3.05 0 3.98 3.4 0 4.44
  [3,80,2.59,0,4.67,3.05,0,3.98,3.4,0,4.44],
// 3 80 2.8 0 -2.81 2.18 0 -2.82 2.24 0 -3.4
  [3,80,2.8,0,-2.81,2.18,0,-2.82,2.24,0,-3.4],
// 4 80 2.18 0 -2.82 2.8 0 -2.81 3.11 0 -2.56 2.04 0 -2.34
  [4,80,2.18,0,-2.82,2.8,0,-2.81,3.11,0,-2.56,2.04,0,-2.34],
// 4 80 2.04 0 -2.34 3.11 0 -2.56 3.33 0 -2.49 1.79 0 -2.05
  [4,80,2.04,0,-2.34,3.11,0,-2.56,3.33,0,-2.49,1.79,0,-2.05],
// 4 80 2.64 0 1.98 1.79 0 -2.05 3.33 0 -2.49 3.04 0 2.21
  [4,80,2.64,0,1.98,1.79,0,-2.05,3.33,0,-2.49,3.04,0,2.21],
// 3 80 3.04 0 2.21 3.33 0 -2.49 3.69 0 -2.52
  [3,80,3.04,0,2.21,3.33,0,-2.49,3.69,0,-2.52],
// 4 80 1.79 0 -2.05 2.64 0 1.98 2.07 0 1.89 1.54 0 -1.95
  [4,80,1.79,0,-2.05,2.64,0,1.98,2.07,0,1.89,1.54,0,-1.95],
// 4 80 1.26 0 -1.97 1.54 0 -1.95 2.07 0 1.89 1.86 0 1.91
  [4,80,1.26,0,-1.97,1.54,0,-1.95,2.07,0,1.89,1.86,0,1.91],
// 4 80 .99 0 -2.17 1.26 0 -1.97 1.86 0 1.91 -1.86 0 1.91
  [4,80,.99,0,-2.17,1.26,0,-1.97,1.86,0,1.91,-1.86,0,1.91],
// 3 80 1.04 0 5.27 .61 0 4.6 1.32 0 3.7
  [3,80,1.04,0,5.27,.61,0,4.6,1.32,0,3.7],
// 4 80 1.32 0 3.7 .61 0 4.6 .27 0 4.24 1.51 0 2.49
  [4,80,1.32,0,3.7,.61,0,4.6,.27,0,4.24,1.51,0,2.49],
// 3 80 .27 0 4.24 0 0 4.22 1.51 0 2.49
  [3,80,.27,0,4.24,0,0,4.22,1.51,0,2.49],
// 4 70 8.5 0 0 8.44641 0 0.2 8.1 0 0 8.44641 0 -0.2
  [4,70,8.5,0,0,8.44641,0,0.2,8.1,0,0,8.44641,0,-0.2],
// 4 70 8.3 0 -0.34641 8.44641 0 -0.2 8.1 0 0 8.1 0 -0.4
  [4,70,8.3,0,-0.34641,8.44641,0,-0.2,8.1,0,0,8.1,0,-0.4],
// 4 70 7.9 0 -0.34641 8.1 0 -0.4 8.1 0 0 7.75359 0 -0.2
  [4,70,7.9,0,-0.34641,8.1,0,-0.4,8.1,0,0,7.75359,0,-0.2],
// 4 70 7.7 0 0 7.75359 0 -0.2 8.1 0 0 7.75359 0 0.2
  [4,70,7.7,0,0,7.75359,0,-0.2,8.1,0,0,7.75359,0,0.2],
// 4 70 7.9 0 0.34641 7.75359 0 0.2 8.1 0 0 8.1 0 0.4
  [4,70,7.9,0,0.34641,7.75359,0,0.2,8.1,0,0,8.1,0,0.4],
// 4 70 8.3 0 0.34641 8.1 0 0.4 8.1 0 0 8.44641 0 0.2
  [4,70,8.3,0,0.34641,8.1,0,0.4,8.1,0,0,8.44641,0,0.2],
// 4 70 4 0 -7.13 3.94641 0 -6.93 3.6 0 -7.13 3.94641 0 -7.33
  [4,70,4,0,-7.13,3.94641,0,-6.93,3.6,0,-7.13,3.94641,0,-7.33],
// 4 70 3.8 0 -7.47641 3.94641 0 -7.33 3.6 0 -7.13 3.6 0 -7.53
  [4,70,3.8,0,-7.47641,3.94641,0,-7.33,3.6,0,-7.13,3.6,0,-7.53],
// 4 70 3.4 0 -7.47641 3.6 0 -7.53 3.6 0 -7.13 3.25359 0 -7.33
  [4,70,3.4,0,-7.47641,3.6,0,-7.53,3.6,0,-7.13,3.25359,0,-7.33],
// 4 70 3.2 0 -7.13 3.25359 0 -7.33 3.6 0 -7.13 3.25359 0 -6.93
  [4,70,3.2,0,-7.13,3.25359,0,-7.33,3.6,0,-7.13,3.25359,0,-6.93],
// 4 70 3.4 0 -6.78359 3.25359 0 -6.93 3.6 0 -7.13 3.6 0 -6.73
  [4,70,3.4,0,-6.78359,3.25359,0,-6.93,3.6,0,-7.13,3.6,0,-6.73],
// 4 70 3.8 0 -6.78359 3.6 0 -6.73 3.6 0 -7.13 3.94641 0 -6.93
  [4,70,3.8,0,-6.78359,3.6,0,-6.73,3.6,0,-7.13,3.94641,0,-6.93],
// 4 70 3.6 0 7.13 3.94641 0 6.93 4 0 7.13 3.94641 0 7.33
  [4,70,3.6,0,7.13,3.94641,0,6.93,4,0,7.13,3.94641,0,7.33],
// 4 70 3.6 0 7.13 3.94641 0 7.33 3.8 0 7.47641 3.6 0 7.53
  [4,70,3.6,0,7.13,3.94641,0,7.33,3.8,0,7.47641,3.6,0,7.53],
// 4 70 3.6 0 7.13 3.6 0 7.53 3.4 0 7.47641 3.25359 0 7.33
  [4,70,3.6,0,7.13,3.6,0,7.53,3.4,0,7.47641,3.25359,0,7.33],
// 4 70 3.6 0 7.13 3.25359 0 7.33 3.2 0 7.13 3.25359 0 6.93
  [4,70,3.6,0,7.13,3.25359,0,7.33,3.2,0,7.13,3.25359,0,6.93],
// 4 70 3.6 0 7.13 3.25359 0 6.93 3.4 0 6.78359 3.6 0 6.73
  [4,70,3.6,0,7.13,3.25359,0,6.93,3.4,0,6.78359,3.6,0,6.73],
// 4 70 3.6 0 7.13 3.6 0 6.73 3.8 0 6.78359 3.94641 0 6.93
  [4,70,3.6,0,7.13,3.6,0,6.73,3.8,0,6.78359,3.94641,0,6.93],
// 4 16 3.4 0 6.78359 3.25359 0 6.93 1.04 0 5.27 2.59 0 4.67
  [4,16,3.4,0,6.78359,3.25359,0,6.93,1.04,0,5.27,2.59,0,4.67],
// 4 16 3.4 0 6.78359 2.59 0 4.67 3.4 0 4.44 3.6 0 6.73
  [4,16,3.4,0,6.78359,2.59,0,4.67,3.4,0,4.44,3.6,0,6.73],
// 4 16 3.8 0 6.78359 3.6 0 6.73 3.4 0 4.44 4.22 0 3.91
  [4,16,3.8,0,6.78359,3.6,0,6.73,3.4,0,4.44,4.22,0,3.91],
// 4 16 3.94641 0 6.93 3.8 0 6.78359 4.22 0 3.91 4.91 0 3.27
  [4,16,3.94641,0,6.93,3.8,0,6.78359,4.22,0,3.91,4.91,0,3.27],
// 4 16 3.94641 0 6.93 4.91 0 3.27 6.3639 0 6.3639 4 0 7.13
  [4,16,3.94641,0,6.93,4.91,0,3.27,6.3639,0,6.3639,4,0,7.13],
// 3 16 3.94641 0 7.33 4 0 7.13 6.3639 0 6.3639
  [3,16,3.94641,0,7.33,4,0,7.13,6.3639,0,6.3639],
// 4 16 3.8 0 7.47641 3.94641 0 7.33 6.3639 0 6.3639 3.4443 0 8.3151
  [4,16,3.8,0,7.47641,3.94641,0,7.33,6.3639,0,6.3639,3.4443,0,8.3151],
// 3 16 3.4443 0 8.3151 3.6 0 7.53 3.8 0 7.47641
  [3,16,3.4443,0,8.3151,3.6,0,7.53,3.8,0,7.47641],
// 3 16 3.4443 0 8.3151 3.4 0 7.47641 3.6 0 7.53
  [3,16,3.4443,0,8.3151,3.4,0,7.47641,3.6,0,7.53],
// 4 16 3.25359 0 7.33 3.4 0 7.47641 3.4443 0 8.3151 0 0 9
  [4,16,3.25359,0,7.33,3.4,0,7.47641,3.4443,0,8.3151,0,0,9],
// 3 16 0 0 9 3.2 0 7.13 3.25359 0 7.33
  [3,16,0,0,9,3.2,0,7.13,3.25359,0,7.33],
// 4 16 3.25359 0 6.93 3.2 0 7.13 0 0 9 1.04 0 5.27
  [4,16,3.25359,0,6.93,3.2,0,7.13,0,0,9,1.04,0,5.27],
// 4 16 4.91 0 3.27 5.52 0 2.49 8.3151 0 3.4443 6.3639 0 6.3639
  [4,16,4.91,0,3.27,5.52,0,2.49,8.3151,0,3.4443,6.3639,0,6.3639],
// 3 16 8.3151 0 3.4443 5.52 0 2.49 5.96 0 1.75
  [3,16,8.3151,0,3.4443,5.52,0,2.49,5.96,0,1.75],
// 4 16 8.3151 0 3.4443 5.96 0 1.75 6.25 0 0.99 8.1 0 0.4
  [4,16,8.3151,0,3.4443,5.96,0,1.75,6.25,0,0.99,8.1,0,0.4],
// 3 16 6.25 0 0.99 7.9 0 0.34641 8.1 0 0.4
  [3,16,6.25,0,0.99,7.9,0,0.34641,8.1,0,0.4],
// 3 16 6.25 0 0.99 7.75359 0 0.2 7.9 0 0.34641
  [3,16,6.25,0,0.99,7.75359,0,0.2,7.9,0,0.34641],
// 4 16 7.7 0 0 7.75359 0 0.2 6.25 0 0.99 6.4 0 0
  [4,16,7.7,0,0,7.75359,0,0.2,6.25,0,0.99,6.4,0,0],
// 4 16 7.75359 0 -0.2 7.7 0 0 6.4 0 0 6.35 0 -0.91
  [4,16,7.75359,0,-0.2,7.7,0,0,6.4,0,0,6.35,0,-0.91],
// 3 16 7.75359 0 -0.2 6.35 0 -0.91 7.9 0 -0.34641
  [3,16,7.75359,0,-0.2,6.35,0,-0.91,7.9,0,-0.34641],
// 4 16 8.1 0 -0.4 7.9 0 -0.34641 6.35 0 -0.91 6.18 0 -1.88
  [4,16,8.1,0,-0.4,7.9,0,-0.34641,6.35,0,-0.91,6.18,0,-1.88],
// 4 16 8.1 0 -0.4 6.18 0 -1.88 8.3151 0 -3.4443 8.3 0 -0.34641
  [4,16,8.1,0,-0.4,6.18,0,-1.88,8.3151,0,-3.4443,8.3,0,-0.34641],
// 4 16 8.44641 0 -0.2 8.3 0 -0.34641 8.3151 0 -3.4443 9 0 0
  [4,16,8.44641,0,-0.2,8.3,0,-0.34641,8.3151,0,-3.4443,9,0,0],
// 3 16 9 0 0 8.5 0 0 8.44641 0 -0.2
  [3,16,9,0,0,8.5,0,0,8.44641,0,-0.2],
// 3 16 8.44641 0 0.2 8.5 0 0 9 0 0
  [3,16,8.44641,0,0.2,8.5,0,0,9,0,0],
// 4 16 8.3 0 0.34641 8.44641 0 0.2 9 0 0 8.3151 0 3.4443
  [4,16,8.3,0,0.34641,8.44641,0,0.2,9,0,0,8.3151,0,3.4443],
// 3 16 8.3151 0 3.4443 8.1 0 0.4 8.3 0 0.34641
  [3,16,8.3151,0,3.4443,8.1,0,0.4,8.3,0,0.34641],
// 3 16 6.18 0 -1.88 5.81 0 -2.79 8.3151 0 -3.4443
  [3,16,6.18,0,-1.88,5.81,0,-2.79,8.3151,0,-3.4443],
// 4 16 8.3151 0 -3.4443 5.81 0 -2.79 5.37 0 -3.57 6.3639 0 -6.3639
  [4,16,8.3151,0,-3.4443,5.81,0,-2.79,5.37,0,-3.57,6.3639,0,-6.3639],
// 3 16 5.37 0 -3.57 4.86 0 -4.3 6.3639 0 -6.3639
  [3,16,5.37,0,-3.57,4.86,0,-4.3,6.3639,0,-6.3639],
// 4 16 6.3639 0 -6.3639 4.86 0 -4.3 4.18 0 -4.79 3.94641 0 -6.93
  [4,16,6.3639,0,-6.3639,4.86,0,-4.3,4.18,0,-4.79,3.94641,0,-6.93],
// 4 16 4.18 0 -4.79 3.18 0 -5.3 3.6 0 -6.73 3.8 0 -6.78359
  [4,16,4.18,0,-4.79,3.18,0,-5.3,3.6,0,-6.73,3.8,0,-6.78359],
// 3 16 4.18 0 -4.79 3.8 0 -6.78359 3.94641 0 -6.93
  [3,16,4.18,0,-4.79,3.8,0,-6.78359,3.94641,0,-6.93],
// 3 16 6.3639 0 -6.3639 3.94641 0 -6.93 4 0 -7.13
  [3,16,6.3639,0,-6.3639,3.94641,0,-6.93,4,0,-7.13],
// 3 16 6.3639 0 -6.3639 4 0 -7.13 3.94641 0 -7.33
  [3,16,6.3639,0,-6.3639,4,0,-7.13,3.94641,0,-7.33],
// 4 16 6.3639 0 -6.3639 3.94641 0 -7.33 3.8 0 -7.47641 3.4443 0 -8.3151
  [4,16,6.3639,0,-6.3639,3.94641,0,-7.33,3.8,0,-7.47641,3.4443,0,-8.3151],
// 3 16 3.8 0 -7.47641 3.6 0 -7.53 3.4443 0 -8.3151
  [3,16,3.8,0,-7.47641,3.6,0,-7.53,3.4443,0,-8.3151],
// 3 16 3.4 0 -7.47641 3.4443 0 -8.3151 3.6 0 -7.53
  [3,16,3.4,0,-7.47641,3.4443,0,-8.3151,3.6,0,-7.53],
// 4 16 3.4443 0 -8.3151 3.4 0 -7.47641 3.25359 0 -7.33 0 0 -9
  [4,16,3.4443,0,-8.3151,3.4,0,-7.47641,3.25359,0,-7.33,0,0,-9],
// 4 16 0 0 -9 3.25359 0 -7.33 3.2 0 -7.13 0 0 -4.59
  [4,16,0,0,-9,3.25359,0,-7.33,3.2,0,-7.13,0,0,-4.59],
// 3 16 3.18 0 -5.3 3.4 0 -6.78359 3.6 0 -6.73
  [3,16,3.18,0,-5.3,3.4,0,-6.78359,3.6,0,-6.73],
// 4 16 3.25359 0 -6.93 3.4 0 -6.78359 3.18 0 -5.3 0 0 -4.59
  [4,16,3.25359,0,-6.93,3.4,0,-6.78359,3.18,0,-5.3,0,0,-4.59],
// 3 16 0 0 -4.59 3.2 0 -7.13 3.25359 0 -6.93
  [3,16,0,0,-4.59,3.2,0,-7.13,3.25359,0,-6.93],
// 4 80 1.51 0 2.49 -1.51 0 2.49 -1.66 0 2.14 1.66 0 2.14
  [4,80,1.51,0,2.49,-1.51,0,2.49,-1.66,0,2.14,1.66,0,2.14],
// 4 80 -1.66 0 2.14 -1.75 0 2 1.75 0 2 1.66 0 2.14
  [4,80,-1.66,0,2.14,-1.75,0,2,1.75,0,2,1.66,0,2.14],
// 4 80 -1.75 0 2 -1.86 0 1.91 1.86 0 1.91 1.75 0 2
  [4,80,-1.75,0,2,-1.86,0,1.91,1.86,0,1.91,1.75,0,2],
// 4 80 -.24 0 -3.92 0 0 -4.59 .24 0 -3.92 -.57 0 -2.89
  [4,80,-.24,0,-3.92,0,0,-4.59,.24,0,-3.92,-.57,0,-2.89],
// 4 80 -.57 0 -2.89 .24 0 -3.92 .57 0 -2.89 -.99 0 -2.17
  [4,80,-.57,0,-2.89,.24,0,-3.92,.57,0,-2.89,-.99,0,-2.17],
// 3 80 .99 0 -2.17 -.99 0 -2.17 .57 0 -2.89
  [3,80,.99,0,-2.17,-.99,0,-2.17,.57,0,-2.89],
// 4 16 -0.61 0 4.6 -0.27 0 4.24 0 0 4.22 0.61 0 4.6
  [4,16,-0.61,0,4.6,-0.27,0,4.24,0,0,4.22,0.61,0,4.6],
// 3 16 0.61 0 4.6 0 0 4.22 0.27 0 4.24
  [3,16,0.61,0,4.6,0,0,4.22,0.27,0,4.24],
// 4 16 -1.04 0 5.27 -0.61 0 4.6 0.61 0 4.6 1.04 0 5.27
  [4,16,-1.04,0,5.27,-0.61,0,4.6,0.61,0,4.6,1.04,0,5.27],
// 3 16 0 0 9 -1.04 0 5.27 1.04 0 5.27
  [3,16,0,0,9,-1.04,0,5.27,1.04,0,5.27],
];
module ldraw_lib__98138pb9(step=0, col=false, unit=2/5, alt=false, line=0.2, solid=!$preview)
    makepoly(ldraw_lib__98138pb9(solid), step=step, col=col, unit=unit, alt=alt, line=line, solid=solid);
ldraw_lib__98138pb9(line=0.2);
